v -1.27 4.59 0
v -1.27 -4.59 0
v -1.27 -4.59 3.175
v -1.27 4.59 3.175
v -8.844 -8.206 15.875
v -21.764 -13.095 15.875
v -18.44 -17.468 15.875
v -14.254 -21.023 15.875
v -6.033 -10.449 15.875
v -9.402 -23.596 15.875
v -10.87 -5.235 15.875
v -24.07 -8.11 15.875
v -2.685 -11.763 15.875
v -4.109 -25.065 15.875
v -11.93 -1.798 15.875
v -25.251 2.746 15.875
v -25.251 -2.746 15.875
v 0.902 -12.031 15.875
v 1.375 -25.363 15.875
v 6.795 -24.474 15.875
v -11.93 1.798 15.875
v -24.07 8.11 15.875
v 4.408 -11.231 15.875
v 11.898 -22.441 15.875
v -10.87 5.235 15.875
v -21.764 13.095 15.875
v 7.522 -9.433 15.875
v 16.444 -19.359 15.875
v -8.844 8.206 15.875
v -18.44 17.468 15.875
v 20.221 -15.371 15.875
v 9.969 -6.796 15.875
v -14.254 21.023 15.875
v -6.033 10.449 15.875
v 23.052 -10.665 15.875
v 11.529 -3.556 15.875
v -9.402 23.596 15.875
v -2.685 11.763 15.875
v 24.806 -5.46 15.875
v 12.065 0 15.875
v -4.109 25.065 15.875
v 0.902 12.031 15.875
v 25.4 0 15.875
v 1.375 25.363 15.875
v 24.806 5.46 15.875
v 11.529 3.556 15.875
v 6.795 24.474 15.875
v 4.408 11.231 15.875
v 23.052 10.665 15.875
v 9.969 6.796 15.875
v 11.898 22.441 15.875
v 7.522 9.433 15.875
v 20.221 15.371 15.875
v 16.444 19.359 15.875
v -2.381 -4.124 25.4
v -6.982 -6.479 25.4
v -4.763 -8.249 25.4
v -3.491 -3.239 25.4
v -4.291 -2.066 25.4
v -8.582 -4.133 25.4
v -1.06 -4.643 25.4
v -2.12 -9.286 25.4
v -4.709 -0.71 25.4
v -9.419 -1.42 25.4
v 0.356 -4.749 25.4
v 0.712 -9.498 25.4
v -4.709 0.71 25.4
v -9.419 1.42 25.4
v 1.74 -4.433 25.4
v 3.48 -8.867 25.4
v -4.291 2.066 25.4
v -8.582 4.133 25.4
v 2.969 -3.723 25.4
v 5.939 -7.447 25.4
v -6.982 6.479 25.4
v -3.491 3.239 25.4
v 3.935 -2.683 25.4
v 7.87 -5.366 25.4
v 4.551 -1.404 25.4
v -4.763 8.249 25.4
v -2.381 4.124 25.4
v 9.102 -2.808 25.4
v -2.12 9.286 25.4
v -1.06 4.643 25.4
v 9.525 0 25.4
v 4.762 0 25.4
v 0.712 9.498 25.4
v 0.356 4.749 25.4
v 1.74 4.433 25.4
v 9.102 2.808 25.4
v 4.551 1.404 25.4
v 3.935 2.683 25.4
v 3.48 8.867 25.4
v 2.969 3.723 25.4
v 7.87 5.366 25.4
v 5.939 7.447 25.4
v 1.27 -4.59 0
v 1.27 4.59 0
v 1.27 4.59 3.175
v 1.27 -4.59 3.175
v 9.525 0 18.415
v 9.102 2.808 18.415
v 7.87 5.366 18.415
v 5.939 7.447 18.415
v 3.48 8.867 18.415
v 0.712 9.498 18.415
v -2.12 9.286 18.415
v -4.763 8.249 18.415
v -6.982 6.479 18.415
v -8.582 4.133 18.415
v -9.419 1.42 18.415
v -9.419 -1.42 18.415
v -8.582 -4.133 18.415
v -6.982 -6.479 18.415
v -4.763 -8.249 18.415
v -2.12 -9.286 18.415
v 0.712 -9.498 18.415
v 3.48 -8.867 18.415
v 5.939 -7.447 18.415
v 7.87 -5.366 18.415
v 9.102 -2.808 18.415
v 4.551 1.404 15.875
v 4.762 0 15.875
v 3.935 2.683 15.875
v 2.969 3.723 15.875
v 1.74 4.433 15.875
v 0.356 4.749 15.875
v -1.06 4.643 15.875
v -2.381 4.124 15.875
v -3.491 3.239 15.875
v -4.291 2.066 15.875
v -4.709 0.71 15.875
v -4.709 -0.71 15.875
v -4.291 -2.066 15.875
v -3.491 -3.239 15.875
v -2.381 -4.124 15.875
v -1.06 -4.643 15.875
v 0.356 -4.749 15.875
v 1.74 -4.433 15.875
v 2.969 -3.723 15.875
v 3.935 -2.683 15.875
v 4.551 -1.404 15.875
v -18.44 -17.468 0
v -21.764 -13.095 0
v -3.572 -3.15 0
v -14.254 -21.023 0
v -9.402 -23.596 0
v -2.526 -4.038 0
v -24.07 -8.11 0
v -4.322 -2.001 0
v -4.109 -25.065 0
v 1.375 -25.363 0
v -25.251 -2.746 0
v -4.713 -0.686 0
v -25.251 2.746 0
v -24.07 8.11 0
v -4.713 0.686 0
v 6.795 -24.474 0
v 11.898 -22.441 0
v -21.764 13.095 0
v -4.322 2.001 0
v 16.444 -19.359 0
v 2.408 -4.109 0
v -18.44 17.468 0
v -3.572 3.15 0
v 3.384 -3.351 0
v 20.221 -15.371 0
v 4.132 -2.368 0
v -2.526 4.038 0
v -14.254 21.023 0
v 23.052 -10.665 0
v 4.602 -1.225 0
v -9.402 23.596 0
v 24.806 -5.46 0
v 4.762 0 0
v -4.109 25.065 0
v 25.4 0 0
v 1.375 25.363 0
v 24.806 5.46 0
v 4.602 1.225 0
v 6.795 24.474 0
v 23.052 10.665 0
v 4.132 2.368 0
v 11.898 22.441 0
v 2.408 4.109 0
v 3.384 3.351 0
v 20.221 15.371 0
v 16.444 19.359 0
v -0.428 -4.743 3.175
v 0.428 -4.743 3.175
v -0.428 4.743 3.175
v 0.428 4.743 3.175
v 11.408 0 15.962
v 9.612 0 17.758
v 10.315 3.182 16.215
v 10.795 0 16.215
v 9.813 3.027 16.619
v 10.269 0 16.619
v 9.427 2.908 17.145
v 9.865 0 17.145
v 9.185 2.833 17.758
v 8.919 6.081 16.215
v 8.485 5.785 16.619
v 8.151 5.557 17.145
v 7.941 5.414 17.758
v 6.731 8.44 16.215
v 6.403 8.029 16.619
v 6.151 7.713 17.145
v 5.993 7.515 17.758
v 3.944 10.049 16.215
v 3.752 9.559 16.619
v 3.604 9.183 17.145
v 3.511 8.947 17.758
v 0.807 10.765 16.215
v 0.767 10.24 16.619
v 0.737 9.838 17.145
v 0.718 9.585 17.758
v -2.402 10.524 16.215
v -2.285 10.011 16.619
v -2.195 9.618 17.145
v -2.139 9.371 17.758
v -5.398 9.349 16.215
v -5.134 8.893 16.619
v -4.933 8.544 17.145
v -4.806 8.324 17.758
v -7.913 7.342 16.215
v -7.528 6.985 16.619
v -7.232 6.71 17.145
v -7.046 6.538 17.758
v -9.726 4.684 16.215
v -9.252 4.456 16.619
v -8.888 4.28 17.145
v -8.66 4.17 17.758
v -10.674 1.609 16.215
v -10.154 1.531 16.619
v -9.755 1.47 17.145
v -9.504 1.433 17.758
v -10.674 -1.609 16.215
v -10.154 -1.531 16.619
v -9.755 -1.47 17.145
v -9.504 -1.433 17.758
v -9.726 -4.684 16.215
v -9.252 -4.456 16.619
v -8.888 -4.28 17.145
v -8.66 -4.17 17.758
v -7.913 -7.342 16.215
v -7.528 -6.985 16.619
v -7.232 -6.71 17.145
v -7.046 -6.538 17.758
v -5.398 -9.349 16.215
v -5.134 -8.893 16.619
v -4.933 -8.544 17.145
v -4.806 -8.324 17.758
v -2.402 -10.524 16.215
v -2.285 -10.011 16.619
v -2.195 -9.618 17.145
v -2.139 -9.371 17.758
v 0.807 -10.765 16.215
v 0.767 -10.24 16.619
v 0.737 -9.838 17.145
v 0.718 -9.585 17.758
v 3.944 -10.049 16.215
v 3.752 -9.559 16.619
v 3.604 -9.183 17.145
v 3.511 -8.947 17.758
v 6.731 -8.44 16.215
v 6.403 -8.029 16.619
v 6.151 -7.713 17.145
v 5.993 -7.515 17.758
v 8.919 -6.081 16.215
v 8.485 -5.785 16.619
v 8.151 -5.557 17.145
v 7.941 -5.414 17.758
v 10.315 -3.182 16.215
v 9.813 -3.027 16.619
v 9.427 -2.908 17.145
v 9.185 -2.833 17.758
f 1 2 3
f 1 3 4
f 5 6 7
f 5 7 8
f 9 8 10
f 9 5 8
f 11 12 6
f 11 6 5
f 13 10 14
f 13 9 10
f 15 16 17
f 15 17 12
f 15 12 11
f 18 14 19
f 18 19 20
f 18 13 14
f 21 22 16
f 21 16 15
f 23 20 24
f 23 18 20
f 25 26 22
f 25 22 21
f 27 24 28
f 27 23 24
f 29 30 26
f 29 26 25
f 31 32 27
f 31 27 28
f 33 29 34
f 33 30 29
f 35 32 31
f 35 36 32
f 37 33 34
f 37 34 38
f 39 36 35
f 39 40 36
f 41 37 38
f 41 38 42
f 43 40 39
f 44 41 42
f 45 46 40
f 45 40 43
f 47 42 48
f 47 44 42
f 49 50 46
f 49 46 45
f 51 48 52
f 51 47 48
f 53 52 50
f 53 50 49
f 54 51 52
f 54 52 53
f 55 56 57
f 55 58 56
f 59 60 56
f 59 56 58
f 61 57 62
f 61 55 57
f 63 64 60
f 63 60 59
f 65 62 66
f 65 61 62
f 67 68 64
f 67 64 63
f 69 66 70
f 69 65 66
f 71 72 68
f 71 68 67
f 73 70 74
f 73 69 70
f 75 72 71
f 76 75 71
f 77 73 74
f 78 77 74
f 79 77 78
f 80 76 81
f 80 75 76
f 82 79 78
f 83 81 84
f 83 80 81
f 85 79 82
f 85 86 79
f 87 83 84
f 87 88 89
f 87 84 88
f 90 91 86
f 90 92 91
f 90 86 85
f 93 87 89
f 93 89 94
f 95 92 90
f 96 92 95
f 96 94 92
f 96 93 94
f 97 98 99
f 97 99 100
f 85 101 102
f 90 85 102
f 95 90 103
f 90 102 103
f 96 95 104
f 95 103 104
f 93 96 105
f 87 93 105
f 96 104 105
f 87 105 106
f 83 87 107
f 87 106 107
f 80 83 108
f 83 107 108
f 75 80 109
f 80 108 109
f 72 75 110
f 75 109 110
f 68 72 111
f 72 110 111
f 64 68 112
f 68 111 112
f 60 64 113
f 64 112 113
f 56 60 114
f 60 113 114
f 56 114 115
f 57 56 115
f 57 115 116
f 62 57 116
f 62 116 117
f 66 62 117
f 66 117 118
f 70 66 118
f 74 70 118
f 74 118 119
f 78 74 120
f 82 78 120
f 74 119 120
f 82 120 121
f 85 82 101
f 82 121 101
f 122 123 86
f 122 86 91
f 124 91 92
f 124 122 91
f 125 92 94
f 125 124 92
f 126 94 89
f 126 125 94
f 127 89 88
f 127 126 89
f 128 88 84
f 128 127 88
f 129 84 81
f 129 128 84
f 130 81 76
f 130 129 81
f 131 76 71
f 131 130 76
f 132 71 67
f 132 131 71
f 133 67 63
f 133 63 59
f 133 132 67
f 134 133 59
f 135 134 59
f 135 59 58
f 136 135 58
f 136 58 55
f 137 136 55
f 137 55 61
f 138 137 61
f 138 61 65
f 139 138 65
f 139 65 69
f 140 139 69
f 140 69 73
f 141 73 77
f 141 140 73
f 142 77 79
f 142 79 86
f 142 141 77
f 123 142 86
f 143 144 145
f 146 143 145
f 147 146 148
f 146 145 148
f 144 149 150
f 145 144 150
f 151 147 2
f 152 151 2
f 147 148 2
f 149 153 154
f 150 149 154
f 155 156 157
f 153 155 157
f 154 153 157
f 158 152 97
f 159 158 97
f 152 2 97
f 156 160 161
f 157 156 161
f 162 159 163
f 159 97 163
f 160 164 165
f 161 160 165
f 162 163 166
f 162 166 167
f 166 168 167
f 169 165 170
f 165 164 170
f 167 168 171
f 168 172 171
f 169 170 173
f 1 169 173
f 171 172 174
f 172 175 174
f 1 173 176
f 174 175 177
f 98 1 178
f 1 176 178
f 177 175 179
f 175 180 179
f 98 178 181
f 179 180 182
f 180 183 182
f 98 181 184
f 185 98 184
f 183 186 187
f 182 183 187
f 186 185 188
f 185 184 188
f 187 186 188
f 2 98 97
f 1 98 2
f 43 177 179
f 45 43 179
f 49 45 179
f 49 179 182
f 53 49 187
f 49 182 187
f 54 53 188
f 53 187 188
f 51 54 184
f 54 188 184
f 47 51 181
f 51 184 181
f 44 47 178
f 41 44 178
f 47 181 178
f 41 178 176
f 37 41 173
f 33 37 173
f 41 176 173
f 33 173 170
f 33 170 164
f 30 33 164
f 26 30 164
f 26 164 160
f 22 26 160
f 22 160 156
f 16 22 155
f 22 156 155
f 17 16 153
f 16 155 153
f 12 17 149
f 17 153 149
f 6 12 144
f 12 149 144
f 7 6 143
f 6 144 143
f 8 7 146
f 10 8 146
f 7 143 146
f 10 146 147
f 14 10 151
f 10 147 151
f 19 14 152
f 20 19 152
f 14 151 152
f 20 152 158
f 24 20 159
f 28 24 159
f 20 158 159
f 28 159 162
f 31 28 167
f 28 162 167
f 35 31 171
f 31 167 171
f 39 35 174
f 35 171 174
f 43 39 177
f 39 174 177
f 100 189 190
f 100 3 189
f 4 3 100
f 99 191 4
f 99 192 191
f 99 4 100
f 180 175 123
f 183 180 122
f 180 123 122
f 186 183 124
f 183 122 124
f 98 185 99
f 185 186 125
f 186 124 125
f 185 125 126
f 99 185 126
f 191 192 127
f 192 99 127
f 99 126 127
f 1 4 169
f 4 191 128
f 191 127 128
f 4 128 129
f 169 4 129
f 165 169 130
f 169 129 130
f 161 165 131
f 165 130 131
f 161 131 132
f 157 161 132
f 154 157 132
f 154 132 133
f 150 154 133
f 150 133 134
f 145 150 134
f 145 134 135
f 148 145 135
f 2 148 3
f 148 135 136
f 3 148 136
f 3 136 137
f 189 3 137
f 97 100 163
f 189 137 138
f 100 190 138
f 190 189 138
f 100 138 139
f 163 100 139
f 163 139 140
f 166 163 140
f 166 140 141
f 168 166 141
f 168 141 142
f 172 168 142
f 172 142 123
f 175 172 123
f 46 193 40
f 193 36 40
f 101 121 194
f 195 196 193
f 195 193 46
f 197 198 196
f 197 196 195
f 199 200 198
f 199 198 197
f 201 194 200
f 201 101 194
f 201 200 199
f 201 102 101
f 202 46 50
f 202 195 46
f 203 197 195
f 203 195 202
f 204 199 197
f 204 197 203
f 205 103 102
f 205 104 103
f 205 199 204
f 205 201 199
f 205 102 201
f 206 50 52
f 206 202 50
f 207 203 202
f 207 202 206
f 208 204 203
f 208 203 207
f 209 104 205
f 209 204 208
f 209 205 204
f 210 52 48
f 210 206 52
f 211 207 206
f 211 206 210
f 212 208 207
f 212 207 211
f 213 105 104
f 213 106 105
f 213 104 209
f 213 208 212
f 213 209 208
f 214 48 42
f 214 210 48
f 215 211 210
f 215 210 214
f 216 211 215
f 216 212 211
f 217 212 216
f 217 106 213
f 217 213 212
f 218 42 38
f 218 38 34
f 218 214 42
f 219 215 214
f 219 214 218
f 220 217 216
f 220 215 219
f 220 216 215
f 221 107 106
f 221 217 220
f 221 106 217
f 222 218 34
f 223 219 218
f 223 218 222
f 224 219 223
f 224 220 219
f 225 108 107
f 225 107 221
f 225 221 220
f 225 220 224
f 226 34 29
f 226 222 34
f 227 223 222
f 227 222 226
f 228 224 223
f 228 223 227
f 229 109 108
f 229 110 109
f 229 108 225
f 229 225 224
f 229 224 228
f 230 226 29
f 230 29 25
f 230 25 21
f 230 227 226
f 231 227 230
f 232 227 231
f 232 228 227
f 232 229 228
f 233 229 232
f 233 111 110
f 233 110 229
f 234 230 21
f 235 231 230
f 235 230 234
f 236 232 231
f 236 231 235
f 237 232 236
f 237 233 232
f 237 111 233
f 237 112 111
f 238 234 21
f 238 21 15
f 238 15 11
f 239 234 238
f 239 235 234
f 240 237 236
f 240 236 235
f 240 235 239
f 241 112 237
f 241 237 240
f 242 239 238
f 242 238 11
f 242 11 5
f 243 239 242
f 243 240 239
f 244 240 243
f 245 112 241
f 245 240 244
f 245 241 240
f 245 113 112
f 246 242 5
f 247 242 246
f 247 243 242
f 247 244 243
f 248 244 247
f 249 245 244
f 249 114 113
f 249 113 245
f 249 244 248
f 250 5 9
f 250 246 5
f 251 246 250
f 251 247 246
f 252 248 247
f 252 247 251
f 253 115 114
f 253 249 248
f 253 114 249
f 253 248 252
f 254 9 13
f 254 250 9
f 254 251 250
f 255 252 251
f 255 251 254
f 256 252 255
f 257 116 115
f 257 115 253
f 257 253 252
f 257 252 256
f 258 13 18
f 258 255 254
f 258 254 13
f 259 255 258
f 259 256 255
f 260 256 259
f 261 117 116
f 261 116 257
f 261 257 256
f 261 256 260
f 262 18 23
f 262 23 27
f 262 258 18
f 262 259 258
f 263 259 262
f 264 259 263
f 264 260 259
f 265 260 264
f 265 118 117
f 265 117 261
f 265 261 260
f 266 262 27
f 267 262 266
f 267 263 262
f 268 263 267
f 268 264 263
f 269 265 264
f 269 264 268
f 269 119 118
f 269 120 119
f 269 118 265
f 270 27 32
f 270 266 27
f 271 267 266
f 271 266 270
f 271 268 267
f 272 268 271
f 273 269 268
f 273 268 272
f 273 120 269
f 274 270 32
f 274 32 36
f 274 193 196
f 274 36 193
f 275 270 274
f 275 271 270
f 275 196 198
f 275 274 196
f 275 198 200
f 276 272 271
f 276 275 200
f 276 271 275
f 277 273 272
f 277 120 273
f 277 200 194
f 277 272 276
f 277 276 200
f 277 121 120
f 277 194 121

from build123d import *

# Parameters (mm, degrees)
SKETCH2_R           = 25.4
BOSS_EXTRUDE1_DEPTH = 15.875
SKETCH3_R           = 9.525
SKETCH3_R_2         = 4.7625
BOSS_EXTRUDE2_DEPTH = 9.525
SKETCH4_R           = 4.7625
CUT_EXTRUDE2_DEPTH  = 24.511
BOSS_EXTRUDE3_DEPTH = 3.175
FILLET1_R           = 2.54


with BuildPart() as part:
    # Sketch2 → Boss-Extrude1 (new body)
    with BuildSketch(Plane.XY):
        Circle(SKETCH2_R)
    extrude(amount=BOSS_EXTRUDE1_DEPTH)

    # Sketch3 → Boss-Extrude2 (add)
    with BuildSketch(Plane.XY.offset(15.875)):
        Circle(SKETCH3_R)
        Circle(SKETCH3_R_2, mode=Mode.SUBTRACT)
    extrude(amount=BOSS_EXTRUDE2_DEPTH)

    # Sketch4 → Cut-Extrude2 (cut)
    with BuildSketch(Plane.XY.offset(15.875)):
        Circle(SKETCH4_R)
    extrude(amount=-CUT_EXTRUDE2_DEPTH, mode=Mode.SUBTRACT)

    # Sketch5 → Boss-Extrude3 (add)
    with BuildSketch(Plane(origin=(0, 0, 0), x_dir=(-1, 0, 0), z_dir=(0, 0, -1))):
        Polygon((0, 4.7625), (1.27, 4.7625), (1.27, 0), (1.27, -4.7625), (0, -4.7625), (-1.27, -4.7625), (-1.27, 0), (-1.27, 4.7625), align=None)
    extrude(amount=-BOSS_EXTRUDE3_DEPTH)

    # Fillet1
    fillet1_edges = [part.edges().sort_by_distance(p)[0] for p in [
        (-9.525, 0, 15.875),
    ]]
    fillet(fillet1_edges, radius=FILLET1_R)


solid = part.part
